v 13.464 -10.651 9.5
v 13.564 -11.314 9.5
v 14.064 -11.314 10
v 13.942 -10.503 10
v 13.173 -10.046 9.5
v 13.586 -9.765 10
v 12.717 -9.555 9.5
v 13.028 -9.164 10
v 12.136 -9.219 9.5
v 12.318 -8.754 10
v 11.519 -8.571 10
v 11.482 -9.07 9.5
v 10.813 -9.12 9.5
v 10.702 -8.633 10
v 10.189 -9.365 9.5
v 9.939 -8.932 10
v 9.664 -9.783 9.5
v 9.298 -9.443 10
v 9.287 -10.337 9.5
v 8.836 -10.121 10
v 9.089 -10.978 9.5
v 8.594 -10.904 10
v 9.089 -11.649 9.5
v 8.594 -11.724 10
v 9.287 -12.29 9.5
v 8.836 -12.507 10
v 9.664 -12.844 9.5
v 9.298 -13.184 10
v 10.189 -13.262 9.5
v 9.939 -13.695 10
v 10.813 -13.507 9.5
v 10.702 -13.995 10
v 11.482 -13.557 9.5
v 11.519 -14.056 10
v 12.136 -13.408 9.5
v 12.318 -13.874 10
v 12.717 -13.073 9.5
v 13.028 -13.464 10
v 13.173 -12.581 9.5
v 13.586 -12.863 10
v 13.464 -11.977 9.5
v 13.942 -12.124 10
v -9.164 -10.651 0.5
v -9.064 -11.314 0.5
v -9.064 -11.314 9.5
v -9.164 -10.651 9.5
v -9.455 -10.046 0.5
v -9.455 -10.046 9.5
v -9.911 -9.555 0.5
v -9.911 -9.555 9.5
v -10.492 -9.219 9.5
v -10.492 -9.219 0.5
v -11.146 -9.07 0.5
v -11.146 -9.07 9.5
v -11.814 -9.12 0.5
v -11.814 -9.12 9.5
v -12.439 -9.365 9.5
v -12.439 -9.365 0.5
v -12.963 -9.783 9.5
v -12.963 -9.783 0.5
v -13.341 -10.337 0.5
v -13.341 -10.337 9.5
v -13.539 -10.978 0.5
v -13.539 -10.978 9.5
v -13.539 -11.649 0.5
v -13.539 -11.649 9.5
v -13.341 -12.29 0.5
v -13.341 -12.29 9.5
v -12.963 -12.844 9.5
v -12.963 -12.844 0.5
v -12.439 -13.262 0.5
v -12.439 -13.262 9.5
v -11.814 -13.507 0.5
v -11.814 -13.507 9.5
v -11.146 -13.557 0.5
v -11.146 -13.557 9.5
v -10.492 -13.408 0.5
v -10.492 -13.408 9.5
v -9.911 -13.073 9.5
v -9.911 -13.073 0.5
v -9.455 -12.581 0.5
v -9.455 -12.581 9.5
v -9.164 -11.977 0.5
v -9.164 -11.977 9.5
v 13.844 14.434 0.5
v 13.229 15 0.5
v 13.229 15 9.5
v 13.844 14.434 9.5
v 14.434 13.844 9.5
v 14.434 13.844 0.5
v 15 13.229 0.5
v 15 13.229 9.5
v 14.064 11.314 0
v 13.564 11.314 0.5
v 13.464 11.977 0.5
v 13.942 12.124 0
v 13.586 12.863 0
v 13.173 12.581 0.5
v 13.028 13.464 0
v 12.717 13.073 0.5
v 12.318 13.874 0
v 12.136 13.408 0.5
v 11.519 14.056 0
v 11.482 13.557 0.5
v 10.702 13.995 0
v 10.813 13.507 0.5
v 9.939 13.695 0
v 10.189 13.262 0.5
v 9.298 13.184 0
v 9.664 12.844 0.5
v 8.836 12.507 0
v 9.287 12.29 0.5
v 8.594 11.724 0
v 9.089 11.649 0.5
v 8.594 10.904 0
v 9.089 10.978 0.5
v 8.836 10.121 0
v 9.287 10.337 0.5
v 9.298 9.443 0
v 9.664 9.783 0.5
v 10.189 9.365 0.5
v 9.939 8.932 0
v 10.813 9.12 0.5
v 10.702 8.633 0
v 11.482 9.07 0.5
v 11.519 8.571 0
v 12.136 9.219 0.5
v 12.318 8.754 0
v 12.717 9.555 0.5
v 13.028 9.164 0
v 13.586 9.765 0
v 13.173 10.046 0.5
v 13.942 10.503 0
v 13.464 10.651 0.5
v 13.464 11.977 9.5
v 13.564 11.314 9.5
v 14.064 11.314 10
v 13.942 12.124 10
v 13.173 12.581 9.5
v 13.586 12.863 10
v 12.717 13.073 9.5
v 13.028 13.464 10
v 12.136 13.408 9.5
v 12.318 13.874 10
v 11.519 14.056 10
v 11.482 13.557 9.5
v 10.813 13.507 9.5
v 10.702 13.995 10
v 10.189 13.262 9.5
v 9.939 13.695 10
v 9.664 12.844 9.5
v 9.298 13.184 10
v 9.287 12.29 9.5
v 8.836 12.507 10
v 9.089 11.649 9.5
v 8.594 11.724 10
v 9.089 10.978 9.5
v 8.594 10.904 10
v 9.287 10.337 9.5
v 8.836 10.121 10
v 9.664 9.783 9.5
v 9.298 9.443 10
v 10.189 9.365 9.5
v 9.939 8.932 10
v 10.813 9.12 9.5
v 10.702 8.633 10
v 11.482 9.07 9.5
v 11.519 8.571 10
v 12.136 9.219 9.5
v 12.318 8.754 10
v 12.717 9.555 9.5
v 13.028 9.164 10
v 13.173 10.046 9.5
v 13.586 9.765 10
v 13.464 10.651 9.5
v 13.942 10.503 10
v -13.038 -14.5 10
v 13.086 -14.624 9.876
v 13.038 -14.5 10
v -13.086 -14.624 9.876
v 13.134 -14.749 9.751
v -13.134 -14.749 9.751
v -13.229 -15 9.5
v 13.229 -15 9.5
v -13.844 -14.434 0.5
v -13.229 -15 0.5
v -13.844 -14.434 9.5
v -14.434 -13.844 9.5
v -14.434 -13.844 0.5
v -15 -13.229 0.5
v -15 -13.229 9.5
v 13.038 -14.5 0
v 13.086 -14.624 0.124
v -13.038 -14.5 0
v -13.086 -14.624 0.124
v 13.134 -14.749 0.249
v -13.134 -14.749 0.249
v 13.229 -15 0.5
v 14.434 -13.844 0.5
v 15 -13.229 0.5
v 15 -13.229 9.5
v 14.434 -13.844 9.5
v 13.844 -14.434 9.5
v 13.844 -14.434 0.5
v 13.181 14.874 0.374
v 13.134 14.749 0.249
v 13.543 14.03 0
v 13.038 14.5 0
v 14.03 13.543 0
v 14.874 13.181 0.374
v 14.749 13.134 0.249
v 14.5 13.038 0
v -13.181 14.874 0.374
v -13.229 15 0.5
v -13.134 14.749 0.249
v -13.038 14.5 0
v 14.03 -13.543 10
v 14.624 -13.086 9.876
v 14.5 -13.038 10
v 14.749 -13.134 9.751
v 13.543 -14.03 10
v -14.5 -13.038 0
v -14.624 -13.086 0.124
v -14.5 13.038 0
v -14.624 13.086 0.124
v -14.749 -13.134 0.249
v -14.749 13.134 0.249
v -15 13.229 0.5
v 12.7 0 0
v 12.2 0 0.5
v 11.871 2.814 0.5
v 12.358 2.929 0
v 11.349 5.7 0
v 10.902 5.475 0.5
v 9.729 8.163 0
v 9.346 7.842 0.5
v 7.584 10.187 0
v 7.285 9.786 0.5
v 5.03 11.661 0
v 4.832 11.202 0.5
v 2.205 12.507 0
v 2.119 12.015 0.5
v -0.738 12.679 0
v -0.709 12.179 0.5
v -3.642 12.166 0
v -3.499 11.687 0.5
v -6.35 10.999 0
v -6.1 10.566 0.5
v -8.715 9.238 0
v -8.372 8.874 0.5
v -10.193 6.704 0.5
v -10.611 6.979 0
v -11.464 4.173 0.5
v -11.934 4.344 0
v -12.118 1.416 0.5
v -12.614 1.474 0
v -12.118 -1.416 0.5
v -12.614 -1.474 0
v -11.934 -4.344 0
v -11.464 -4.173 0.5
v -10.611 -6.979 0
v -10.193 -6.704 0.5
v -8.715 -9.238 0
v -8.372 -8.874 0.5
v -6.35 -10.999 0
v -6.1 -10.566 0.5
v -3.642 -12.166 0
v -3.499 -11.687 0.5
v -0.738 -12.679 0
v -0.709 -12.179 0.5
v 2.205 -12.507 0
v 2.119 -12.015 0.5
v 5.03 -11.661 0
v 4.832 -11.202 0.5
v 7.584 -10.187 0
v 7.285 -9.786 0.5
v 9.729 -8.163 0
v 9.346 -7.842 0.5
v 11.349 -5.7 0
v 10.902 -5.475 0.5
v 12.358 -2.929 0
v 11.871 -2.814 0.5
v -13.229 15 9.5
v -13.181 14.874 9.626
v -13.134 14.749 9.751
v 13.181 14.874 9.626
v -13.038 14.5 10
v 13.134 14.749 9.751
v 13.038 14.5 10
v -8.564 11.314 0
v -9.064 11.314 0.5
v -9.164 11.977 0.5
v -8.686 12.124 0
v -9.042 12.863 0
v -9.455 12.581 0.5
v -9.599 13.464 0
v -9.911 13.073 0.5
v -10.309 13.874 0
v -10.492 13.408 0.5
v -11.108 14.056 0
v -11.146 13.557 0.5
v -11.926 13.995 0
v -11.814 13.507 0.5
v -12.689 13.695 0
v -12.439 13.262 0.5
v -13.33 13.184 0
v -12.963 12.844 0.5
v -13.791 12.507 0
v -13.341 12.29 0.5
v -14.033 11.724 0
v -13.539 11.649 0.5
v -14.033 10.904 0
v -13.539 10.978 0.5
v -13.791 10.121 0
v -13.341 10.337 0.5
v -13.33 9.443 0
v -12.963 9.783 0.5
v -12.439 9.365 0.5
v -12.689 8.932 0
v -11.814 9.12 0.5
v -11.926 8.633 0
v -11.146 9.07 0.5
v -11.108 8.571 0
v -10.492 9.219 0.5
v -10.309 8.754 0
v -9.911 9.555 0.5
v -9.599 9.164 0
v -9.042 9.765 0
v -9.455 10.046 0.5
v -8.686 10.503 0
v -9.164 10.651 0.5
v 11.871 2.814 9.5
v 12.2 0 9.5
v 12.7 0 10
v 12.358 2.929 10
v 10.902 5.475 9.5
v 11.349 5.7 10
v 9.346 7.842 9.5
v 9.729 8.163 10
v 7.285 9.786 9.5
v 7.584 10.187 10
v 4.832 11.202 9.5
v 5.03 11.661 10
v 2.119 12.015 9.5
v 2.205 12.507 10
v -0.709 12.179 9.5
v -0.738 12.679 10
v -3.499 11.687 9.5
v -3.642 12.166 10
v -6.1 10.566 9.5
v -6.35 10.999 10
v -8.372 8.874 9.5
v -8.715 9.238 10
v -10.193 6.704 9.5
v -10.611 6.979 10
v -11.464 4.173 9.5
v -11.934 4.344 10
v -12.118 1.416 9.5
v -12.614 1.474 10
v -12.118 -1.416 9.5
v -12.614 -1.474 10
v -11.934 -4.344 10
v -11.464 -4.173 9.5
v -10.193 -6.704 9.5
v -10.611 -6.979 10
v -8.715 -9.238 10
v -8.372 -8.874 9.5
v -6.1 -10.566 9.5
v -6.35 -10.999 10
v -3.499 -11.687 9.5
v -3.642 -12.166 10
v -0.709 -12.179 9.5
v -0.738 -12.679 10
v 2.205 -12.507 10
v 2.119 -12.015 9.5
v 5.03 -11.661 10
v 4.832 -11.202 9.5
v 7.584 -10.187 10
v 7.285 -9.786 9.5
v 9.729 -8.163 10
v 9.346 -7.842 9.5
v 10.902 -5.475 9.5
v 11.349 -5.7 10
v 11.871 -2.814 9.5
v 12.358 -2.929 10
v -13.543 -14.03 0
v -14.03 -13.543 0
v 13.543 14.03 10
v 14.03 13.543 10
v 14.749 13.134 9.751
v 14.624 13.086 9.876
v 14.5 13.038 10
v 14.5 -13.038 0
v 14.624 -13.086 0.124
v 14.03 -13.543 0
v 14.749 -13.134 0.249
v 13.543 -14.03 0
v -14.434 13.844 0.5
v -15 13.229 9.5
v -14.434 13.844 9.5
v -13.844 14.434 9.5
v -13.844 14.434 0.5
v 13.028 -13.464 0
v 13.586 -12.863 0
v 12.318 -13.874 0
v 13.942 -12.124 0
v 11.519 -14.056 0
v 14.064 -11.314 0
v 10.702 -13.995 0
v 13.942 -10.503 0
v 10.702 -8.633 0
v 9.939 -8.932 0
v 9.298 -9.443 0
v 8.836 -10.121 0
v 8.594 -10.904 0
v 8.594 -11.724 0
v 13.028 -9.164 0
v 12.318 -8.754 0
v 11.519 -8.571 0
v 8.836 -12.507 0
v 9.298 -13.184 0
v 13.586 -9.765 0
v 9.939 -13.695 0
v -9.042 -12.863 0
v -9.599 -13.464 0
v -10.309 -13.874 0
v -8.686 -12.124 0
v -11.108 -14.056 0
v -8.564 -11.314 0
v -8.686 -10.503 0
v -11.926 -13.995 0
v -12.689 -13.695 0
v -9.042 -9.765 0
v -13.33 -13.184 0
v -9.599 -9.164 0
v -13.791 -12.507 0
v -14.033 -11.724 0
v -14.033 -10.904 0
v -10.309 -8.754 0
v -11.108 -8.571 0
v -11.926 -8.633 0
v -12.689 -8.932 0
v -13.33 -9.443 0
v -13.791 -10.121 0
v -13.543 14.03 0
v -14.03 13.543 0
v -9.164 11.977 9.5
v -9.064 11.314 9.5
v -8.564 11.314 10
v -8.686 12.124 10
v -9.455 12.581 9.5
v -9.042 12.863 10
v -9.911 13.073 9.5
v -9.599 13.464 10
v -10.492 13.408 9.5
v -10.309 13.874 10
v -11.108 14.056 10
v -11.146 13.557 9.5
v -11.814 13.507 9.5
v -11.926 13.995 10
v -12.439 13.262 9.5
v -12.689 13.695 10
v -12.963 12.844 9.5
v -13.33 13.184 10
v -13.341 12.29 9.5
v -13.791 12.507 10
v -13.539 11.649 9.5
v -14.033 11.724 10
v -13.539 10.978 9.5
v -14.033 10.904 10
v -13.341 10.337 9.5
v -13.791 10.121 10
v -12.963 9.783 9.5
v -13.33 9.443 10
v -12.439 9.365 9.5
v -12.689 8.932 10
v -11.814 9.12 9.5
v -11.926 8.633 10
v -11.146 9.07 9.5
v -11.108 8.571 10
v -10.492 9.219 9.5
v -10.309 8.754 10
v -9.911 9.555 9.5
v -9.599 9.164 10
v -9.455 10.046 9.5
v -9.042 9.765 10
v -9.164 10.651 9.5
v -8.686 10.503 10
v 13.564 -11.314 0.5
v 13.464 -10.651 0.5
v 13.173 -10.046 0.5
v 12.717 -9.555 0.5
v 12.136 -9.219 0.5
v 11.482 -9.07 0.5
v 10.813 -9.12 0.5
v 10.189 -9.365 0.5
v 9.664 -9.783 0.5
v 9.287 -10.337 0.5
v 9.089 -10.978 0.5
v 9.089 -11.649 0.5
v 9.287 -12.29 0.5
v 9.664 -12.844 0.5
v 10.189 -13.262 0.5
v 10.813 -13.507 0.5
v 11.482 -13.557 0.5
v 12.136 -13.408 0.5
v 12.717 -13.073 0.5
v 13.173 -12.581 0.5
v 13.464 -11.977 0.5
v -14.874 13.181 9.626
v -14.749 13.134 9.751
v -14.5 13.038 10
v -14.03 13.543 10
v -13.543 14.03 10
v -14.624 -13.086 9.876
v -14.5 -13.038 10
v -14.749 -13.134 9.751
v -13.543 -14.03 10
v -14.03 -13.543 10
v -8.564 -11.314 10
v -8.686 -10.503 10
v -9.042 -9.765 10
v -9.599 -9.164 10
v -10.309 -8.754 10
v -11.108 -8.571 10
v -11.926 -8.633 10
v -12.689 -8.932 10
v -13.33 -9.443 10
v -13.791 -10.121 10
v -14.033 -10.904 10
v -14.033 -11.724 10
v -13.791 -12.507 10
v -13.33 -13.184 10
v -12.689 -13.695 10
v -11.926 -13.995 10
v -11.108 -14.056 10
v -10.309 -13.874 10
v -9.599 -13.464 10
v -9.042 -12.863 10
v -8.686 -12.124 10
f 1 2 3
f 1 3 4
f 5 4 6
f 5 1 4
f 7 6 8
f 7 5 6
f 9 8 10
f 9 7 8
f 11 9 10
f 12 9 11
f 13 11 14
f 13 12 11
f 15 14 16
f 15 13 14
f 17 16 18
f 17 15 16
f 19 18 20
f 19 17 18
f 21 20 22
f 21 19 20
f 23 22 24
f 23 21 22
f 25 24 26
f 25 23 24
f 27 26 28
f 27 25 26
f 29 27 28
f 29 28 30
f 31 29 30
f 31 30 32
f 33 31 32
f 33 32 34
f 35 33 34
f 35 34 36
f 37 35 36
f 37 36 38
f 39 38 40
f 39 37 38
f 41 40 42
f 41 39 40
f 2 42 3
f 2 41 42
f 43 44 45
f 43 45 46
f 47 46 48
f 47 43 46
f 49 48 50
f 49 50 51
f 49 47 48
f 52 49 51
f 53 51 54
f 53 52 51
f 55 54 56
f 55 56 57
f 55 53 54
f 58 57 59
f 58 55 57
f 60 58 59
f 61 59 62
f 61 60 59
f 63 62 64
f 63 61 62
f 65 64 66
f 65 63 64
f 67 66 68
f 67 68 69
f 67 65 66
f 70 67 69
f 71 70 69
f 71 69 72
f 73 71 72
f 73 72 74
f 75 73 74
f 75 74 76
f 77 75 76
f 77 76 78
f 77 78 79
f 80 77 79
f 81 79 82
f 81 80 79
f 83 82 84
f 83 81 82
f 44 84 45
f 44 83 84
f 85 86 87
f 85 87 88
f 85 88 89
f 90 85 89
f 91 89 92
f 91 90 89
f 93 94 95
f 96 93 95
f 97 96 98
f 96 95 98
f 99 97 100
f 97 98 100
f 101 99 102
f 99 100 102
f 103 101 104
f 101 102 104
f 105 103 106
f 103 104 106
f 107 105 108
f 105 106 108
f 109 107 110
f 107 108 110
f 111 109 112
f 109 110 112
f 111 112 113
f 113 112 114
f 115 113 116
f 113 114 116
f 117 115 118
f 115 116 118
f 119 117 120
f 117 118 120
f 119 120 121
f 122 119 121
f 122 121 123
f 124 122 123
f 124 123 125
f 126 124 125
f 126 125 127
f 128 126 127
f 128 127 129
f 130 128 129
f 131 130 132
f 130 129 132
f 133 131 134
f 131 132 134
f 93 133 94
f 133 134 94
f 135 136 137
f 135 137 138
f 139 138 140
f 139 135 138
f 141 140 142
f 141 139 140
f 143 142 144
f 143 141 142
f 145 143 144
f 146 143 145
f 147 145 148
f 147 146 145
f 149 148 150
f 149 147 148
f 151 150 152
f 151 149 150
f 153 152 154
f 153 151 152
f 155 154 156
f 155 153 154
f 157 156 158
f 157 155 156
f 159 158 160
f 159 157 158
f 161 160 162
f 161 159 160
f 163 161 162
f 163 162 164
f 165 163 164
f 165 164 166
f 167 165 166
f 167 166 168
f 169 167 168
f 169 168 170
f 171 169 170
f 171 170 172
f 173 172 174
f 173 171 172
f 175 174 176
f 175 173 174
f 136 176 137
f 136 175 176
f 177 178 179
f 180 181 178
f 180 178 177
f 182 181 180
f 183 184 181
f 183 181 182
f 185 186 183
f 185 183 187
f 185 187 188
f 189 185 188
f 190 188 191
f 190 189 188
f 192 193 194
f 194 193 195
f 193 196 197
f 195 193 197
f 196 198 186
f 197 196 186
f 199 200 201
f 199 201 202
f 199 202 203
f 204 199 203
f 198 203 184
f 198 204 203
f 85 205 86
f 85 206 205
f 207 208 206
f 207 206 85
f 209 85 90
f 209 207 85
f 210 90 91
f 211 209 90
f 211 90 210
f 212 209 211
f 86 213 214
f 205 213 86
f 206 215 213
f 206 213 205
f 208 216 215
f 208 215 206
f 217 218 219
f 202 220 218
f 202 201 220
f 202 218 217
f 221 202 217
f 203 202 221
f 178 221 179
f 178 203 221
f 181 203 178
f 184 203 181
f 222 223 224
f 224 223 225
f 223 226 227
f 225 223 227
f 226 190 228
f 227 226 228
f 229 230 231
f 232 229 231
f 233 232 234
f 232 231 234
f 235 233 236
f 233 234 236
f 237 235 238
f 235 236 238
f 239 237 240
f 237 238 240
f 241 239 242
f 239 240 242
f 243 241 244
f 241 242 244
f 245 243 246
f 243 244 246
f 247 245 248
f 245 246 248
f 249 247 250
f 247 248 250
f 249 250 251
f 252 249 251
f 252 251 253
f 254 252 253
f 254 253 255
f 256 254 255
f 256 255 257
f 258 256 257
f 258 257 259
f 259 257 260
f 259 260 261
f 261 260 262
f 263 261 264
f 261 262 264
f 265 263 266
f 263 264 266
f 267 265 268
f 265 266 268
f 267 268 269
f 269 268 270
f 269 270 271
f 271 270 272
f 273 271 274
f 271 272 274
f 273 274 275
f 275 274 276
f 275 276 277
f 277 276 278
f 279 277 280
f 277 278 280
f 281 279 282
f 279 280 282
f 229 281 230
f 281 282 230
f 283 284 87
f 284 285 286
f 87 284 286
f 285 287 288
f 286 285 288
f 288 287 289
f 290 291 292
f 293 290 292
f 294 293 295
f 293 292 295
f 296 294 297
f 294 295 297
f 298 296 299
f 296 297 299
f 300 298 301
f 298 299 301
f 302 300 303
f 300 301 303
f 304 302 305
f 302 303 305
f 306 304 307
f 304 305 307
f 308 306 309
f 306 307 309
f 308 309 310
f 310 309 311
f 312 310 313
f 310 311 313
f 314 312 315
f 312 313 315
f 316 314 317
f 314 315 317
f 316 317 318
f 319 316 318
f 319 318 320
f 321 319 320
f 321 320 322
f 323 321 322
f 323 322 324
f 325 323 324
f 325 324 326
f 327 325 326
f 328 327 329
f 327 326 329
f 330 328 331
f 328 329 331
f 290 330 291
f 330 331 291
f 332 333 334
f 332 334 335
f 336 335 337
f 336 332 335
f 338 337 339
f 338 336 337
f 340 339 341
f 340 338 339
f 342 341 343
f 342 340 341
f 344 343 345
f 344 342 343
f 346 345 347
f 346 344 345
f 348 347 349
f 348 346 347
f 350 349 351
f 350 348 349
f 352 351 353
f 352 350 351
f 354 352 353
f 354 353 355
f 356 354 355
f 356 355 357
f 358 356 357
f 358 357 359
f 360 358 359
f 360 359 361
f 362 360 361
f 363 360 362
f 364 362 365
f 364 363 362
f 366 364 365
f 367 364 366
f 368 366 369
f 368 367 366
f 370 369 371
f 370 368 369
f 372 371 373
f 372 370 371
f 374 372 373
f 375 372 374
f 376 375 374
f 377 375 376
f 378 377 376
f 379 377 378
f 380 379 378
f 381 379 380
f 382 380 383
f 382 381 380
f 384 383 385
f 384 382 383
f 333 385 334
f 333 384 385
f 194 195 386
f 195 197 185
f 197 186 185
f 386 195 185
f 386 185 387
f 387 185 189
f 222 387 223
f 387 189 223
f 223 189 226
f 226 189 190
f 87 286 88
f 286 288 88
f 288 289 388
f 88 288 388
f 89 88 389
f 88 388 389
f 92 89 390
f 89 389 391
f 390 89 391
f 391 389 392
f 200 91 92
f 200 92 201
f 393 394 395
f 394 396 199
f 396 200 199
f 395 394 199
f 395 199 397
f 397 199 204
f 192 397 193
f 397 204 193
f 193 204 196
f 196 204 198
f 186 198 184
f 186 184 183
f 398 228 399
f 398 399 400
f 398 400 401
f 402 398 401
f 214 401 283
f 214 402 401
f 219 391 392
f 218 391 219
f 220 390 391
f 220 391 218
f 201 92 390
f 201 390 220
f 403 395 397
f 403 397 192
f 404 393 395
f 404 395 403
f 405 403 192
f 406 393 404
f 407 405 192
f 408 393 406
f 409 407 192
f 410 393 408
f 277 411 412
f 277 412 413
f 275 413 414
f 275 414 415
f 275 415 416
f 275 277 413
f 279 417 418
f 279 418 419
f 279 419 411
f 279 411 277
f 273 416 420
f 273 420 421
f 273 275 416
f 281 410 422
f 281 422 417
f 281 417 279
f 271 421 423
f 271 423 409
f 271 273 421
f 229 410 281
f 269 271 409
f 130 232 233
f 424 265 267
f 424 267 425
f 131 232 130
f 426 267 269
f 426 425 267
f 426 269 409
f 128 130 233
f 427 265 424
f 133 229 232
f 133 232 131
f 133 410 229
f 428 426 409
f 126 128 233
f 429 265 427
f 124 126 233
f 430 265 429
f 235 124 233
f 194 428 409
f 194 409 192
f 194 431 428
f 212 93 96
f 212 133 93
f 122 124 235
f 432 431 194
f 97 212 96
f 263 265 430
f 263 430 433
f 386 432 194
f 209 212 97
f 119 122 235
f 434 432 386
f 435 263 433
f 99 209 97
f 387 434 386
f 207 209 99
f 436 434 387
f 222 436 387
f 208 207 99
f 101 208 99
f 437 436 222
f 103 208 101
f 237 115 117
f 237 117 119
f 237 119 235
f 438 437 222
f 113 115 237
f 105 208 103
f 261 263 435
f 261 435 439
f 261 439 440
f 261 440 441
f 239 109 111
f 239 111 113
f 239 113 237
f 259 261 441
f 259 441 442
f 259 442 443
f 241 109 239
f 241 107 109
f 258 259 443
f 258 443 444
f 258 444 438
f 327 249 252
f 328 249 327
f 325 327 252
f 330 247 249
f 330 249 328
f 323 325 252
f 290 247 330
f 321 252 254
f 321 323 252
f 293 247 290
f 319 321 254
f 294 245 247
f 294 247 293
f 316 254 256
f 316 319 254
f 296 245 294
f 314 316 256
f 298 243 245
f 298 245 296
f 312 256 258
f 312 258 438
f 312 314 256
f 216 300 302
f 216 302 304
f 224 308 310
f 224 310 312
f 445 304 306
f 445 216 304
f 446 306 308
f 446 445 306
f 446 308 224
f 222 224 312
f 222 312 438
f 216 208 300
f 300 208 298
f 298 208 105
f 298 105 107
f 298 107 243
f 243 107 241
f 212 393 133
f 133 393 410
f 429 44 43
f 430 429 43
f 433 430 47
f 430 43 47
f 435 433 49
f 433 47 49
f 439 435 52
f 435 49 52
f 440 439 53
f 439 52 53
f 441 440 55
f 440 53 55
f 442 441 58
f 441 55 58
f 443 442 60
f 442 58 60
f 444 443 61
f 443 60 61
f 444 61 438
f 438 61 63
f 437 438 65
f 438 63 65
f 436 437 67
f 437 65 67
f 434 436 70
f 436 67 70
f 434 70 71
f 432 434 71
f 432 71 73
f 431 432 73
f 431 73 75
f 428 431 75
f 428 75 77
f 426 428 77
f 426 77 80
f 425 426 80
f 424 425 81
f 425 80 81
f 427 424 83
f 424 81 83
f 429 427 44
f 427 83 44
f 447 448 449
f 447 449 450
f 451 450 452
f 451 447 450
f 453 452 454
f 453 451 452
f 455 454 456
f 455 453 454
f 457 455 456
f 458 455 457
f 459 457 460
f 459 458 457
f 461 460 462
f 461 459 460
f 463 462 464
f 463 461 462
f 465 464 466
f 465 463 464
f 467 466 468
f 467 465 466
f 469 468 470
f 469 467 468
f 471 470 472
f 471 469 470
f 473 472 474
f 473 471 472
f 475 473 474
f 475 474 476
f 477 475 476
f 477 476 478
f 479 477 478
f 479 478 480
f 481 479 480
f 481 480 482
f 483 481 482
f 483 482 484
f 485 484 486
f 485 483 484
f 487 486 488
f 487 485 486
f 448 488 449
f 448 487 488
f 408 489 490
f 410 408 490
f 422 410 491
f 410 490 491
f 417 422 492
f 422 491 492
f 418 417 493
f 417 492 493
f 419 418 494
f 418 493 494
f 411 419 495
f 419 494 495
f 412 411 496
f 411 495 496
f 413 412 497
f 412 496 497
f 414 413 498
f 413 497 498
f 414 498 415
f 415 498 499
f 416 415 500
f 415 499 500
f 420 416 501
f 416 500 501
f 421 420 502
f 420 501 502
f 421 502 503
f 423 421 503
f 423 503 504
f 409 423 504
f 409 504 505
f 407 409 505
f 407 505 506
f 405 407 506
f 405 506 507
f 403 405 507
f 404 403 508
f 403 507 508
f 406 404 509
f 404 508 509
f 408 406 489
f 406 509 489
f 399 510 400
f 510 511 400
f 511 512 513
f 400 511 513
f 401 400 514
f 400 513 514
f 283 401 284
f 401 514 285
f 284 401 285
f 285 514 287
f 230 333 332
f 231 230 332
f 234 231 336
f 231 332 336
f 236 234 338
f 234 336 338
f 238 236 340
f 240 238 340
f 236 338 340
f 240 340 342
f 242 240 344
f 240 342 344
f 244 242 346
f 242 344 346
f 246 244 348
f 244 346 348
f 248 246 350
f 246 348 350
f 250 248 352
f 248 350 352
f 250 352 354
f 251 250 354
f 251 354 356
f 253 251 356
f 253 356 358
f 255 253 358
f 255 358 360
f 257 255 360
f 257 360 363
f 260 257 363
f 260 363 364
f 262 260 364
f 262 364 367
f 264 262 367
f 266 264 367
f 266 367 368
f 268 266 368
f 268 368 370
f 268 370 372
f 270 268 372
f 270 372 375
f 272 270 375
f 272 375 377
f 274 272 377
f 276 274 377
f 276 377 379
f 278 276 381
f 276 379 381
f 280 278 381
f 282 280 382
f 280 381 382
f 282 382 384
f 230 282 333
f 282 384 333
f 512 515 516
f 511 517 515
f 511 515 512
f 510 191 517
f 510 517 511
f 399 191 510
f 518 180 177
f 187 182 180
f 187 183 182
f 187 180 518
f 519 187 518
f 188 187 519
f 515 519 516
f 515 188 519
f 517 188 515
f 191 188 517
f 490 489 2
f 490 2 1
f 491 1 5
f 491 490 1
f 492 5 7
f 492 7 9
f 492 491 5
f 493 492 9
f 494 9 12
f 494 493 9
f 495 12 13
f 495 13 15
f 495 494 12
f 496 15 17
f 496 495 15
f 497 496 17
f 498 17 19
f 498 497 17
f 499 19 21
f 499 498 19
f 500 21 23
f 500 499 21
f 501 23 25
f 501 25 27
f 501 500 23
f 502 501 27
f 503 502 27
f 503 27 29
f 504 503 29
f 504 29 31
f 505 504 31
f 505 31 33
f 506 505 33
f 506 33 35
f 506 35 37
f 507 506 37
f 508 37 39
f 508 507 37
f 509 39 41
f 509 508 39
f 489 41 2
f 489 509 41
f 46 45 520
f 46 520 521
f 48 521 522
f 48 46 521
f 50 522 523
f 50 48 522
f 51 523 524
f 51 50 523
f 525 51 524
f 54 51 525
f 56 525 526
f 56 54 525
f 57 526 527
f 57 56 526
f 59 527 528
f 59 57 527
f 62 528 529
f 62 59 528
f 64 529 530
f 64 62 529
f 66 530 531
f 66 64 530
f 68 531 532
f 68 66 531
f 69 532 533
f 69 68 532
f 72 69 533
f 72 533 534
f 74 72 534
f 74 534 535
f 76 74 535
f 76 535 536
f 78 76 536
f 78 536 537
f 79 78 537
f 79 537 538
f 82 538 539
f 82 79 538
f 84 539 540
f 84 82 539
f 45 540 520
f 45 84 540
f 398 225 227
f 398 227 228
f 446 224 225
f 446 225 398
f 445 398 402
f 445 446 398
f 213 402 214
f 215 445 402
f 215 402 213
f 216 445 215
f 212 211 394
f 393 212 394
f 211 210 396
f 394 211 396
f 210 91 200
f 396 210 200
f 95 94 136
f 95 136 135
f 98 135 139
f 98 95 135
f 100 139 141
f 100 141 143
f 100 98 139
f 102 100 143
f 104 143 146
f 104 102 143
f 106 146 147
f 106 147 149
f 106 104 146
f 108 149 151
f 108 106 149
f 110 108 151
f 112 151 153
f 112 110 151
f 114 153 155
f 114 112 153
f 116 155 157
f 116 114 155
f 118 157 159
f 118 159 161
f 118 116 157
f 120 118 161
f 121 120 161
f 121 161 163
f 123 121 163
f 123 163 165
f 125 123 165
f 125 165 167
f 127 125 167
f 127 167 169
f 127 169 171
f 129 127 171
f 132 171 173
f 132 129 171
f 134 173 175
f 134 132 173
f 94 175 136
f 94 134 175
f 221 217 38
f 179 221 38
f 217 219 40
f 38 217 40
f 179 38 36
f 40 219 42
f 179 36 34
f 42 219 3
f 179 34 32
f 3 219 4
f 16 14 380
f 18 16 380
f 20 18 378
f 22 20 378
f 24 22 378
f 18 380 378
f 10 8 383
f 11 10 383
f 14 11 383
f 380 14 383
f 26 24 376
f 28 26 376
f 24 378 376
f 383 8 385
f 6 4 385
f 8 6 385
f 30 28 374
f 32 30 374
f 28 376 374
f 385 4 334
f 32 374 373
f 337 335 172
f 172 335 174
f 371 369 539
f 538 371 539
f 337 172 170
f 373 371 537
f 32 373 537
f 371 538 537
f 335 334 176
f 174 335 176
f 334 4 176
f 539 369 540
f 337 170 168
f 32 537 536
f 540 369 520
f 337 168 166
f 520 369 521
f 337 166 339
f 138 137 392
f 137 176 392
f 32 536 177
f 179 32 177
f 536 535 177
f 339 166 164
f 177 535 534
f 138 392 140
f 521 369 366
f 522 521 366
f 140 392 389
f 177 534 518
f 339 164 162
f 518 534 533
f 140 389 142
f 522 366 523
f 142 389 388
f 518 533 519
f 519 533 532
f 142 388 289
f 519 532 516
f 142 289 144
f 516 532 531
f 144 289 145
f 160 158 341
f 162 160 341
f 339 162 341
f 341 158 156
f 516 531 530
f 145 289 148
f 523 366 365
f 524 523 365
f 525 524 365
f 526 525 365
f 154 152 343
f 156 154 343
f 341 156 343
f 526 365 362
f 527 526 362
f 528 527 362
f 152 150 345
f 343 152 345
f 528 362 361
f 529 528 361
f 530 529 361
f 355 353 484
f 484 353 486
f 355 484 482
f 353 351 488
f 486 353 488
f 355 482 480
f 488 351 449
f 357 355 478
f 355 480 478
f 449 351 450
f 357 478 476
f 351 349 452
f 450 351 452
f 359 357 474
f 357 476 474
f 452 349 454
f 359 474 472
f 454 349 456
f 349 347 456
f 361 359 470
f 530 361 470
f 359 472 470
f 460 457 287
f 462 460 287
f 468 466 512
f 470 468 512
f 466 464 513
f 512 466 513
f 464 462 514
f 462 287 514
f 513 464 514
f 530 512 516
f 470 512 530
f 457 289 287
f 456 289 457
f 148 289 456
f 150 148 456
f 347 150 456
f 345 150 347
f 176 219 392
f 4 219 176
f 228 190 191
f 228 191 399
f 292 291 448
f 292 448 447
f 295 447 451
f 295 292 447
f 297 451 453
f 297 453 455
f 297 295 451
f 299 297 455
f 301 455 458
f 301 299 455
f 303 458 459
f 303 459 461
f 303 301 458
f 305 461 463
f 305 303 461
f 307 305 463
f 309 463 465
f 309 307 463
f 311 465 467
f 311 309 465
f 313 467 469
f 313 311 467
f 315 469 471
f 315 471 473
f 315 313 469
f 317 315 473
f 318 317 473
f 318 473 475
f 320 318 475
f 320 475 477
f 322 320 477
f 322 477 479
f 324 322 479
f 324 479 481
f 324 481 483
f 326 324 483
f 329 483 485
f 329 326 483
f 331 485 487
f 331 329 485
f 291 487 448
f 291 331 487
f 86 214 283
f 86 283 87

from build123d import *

# Parameters (mm, degrees)
SKETCH1_R           = 2.25
BOSS_EXTRUDE1_DEPTH = 10
SKETCH2_R           = 12.2
CUT_EXTRUDE3_DEPTH  = 11
CHAMFER1_SIZE       = 0.5


with BuildPart() as part:
    # Sketch1 → Boss-Extrude1 (new body)
    with BuildSketch(Plane.XY):
        with BuildLine():
            Line((-13.228756555, 15), (13.228756555, 15))
            ThreePointArc((13.228756555, 15), (14.142135624, 14.142135624), (15, 13.228756555))
            Line((15, 13.228756555), (15, -13.228756555))
            ThreePointArc((15, -13.228756555), (14.142135624, -14.142135624), (13.228756555, -15))
            Line((13.228756555, -15), (-13.228756555, -15))
            ThreePointArc((-13.228756555, -15), (-14.142135624, -14.142135624), (-15, -13.228756555))
            Line((-15, -13.228756555), (-15, 13.228756555))
            ThreePointArc((-15, 13.228756555), (-14.142135624, 14.142135624), (-13.228756555, 15))
        make_face()
        with Locations((-11.313708499, 11.313708499)):
            Circle(SKETCH1_R, mode=Mode.SUBTRACT)
        with Locations((11.313708499, 11.313708499)):
            Circle(SKETCH1_R, mode=Mode.SUBTRACT)
        with Locations((11.313708499, -11.313708499)):
            Circle(SKETCH1_R, mode=Mode.SUBTRACT)
        with Locations((-11.313708499, -11.313708499)):
            Circle(SKETCH1_R, mode=Mode.SUBTRACT)
    extrude(amount=BOSS_EXTRUDE1_DEPTH)

    # Sketch2 → Cut-Extrude3 (cut, through all)
    with BuildSketch(Plane.XY.offset(10)):
        Circle(SKETCH2_R)
    extrude(amount=-CUT_EXTRUDE3_DEPTH, mode=Mode.SUBTRACT)

    # Chamfer1
    chamfer1_edges = [part.edges().sort_by_distance(p)[0] for p in [
        (-14.142135624, -14.142135624, 10),
        (-15, 0, 0),
        (-14.142135624, 14.142135624, 0),
        (0, -15, 10),
        (14.142135624, -14.142135624, 10),
        (15, 0, 10),
        (-13.563708499, 11.313708499, 0),
        (-13.563708499, 11.313708499, 10),
        (14.142135624, 14.142135624, 10),
        (9.063708499, 11.313708499, 0),
        (9.063708499, 11.313708499, 10),
        (0, 15, 10),
        (9.063708499, -11.313708499, 0),
        (9.063708499, -11.313708499, 10),
        (-13.563708499, -11.313708499, 0),
        (-13.563708499, -11.313708499, 10),
        (-14.142135624, 14.142135624, 10),
        (-12.2, 0, 0),
        (-12.2, 0, 10),
        (-15, 0, 10),
        (0, 15, 0),
        (14.142135624, 14.142135624, 0),
        (15, 0, 0),
        (14.142135624, -14.142135624, 0),
        (0, -15, 0),
        (-14.142135624, -14.142135624, 0),
    ]]
    chamfer(chamfer1_edges, length=CHAMFER1_SIZE)


solid = part.part
